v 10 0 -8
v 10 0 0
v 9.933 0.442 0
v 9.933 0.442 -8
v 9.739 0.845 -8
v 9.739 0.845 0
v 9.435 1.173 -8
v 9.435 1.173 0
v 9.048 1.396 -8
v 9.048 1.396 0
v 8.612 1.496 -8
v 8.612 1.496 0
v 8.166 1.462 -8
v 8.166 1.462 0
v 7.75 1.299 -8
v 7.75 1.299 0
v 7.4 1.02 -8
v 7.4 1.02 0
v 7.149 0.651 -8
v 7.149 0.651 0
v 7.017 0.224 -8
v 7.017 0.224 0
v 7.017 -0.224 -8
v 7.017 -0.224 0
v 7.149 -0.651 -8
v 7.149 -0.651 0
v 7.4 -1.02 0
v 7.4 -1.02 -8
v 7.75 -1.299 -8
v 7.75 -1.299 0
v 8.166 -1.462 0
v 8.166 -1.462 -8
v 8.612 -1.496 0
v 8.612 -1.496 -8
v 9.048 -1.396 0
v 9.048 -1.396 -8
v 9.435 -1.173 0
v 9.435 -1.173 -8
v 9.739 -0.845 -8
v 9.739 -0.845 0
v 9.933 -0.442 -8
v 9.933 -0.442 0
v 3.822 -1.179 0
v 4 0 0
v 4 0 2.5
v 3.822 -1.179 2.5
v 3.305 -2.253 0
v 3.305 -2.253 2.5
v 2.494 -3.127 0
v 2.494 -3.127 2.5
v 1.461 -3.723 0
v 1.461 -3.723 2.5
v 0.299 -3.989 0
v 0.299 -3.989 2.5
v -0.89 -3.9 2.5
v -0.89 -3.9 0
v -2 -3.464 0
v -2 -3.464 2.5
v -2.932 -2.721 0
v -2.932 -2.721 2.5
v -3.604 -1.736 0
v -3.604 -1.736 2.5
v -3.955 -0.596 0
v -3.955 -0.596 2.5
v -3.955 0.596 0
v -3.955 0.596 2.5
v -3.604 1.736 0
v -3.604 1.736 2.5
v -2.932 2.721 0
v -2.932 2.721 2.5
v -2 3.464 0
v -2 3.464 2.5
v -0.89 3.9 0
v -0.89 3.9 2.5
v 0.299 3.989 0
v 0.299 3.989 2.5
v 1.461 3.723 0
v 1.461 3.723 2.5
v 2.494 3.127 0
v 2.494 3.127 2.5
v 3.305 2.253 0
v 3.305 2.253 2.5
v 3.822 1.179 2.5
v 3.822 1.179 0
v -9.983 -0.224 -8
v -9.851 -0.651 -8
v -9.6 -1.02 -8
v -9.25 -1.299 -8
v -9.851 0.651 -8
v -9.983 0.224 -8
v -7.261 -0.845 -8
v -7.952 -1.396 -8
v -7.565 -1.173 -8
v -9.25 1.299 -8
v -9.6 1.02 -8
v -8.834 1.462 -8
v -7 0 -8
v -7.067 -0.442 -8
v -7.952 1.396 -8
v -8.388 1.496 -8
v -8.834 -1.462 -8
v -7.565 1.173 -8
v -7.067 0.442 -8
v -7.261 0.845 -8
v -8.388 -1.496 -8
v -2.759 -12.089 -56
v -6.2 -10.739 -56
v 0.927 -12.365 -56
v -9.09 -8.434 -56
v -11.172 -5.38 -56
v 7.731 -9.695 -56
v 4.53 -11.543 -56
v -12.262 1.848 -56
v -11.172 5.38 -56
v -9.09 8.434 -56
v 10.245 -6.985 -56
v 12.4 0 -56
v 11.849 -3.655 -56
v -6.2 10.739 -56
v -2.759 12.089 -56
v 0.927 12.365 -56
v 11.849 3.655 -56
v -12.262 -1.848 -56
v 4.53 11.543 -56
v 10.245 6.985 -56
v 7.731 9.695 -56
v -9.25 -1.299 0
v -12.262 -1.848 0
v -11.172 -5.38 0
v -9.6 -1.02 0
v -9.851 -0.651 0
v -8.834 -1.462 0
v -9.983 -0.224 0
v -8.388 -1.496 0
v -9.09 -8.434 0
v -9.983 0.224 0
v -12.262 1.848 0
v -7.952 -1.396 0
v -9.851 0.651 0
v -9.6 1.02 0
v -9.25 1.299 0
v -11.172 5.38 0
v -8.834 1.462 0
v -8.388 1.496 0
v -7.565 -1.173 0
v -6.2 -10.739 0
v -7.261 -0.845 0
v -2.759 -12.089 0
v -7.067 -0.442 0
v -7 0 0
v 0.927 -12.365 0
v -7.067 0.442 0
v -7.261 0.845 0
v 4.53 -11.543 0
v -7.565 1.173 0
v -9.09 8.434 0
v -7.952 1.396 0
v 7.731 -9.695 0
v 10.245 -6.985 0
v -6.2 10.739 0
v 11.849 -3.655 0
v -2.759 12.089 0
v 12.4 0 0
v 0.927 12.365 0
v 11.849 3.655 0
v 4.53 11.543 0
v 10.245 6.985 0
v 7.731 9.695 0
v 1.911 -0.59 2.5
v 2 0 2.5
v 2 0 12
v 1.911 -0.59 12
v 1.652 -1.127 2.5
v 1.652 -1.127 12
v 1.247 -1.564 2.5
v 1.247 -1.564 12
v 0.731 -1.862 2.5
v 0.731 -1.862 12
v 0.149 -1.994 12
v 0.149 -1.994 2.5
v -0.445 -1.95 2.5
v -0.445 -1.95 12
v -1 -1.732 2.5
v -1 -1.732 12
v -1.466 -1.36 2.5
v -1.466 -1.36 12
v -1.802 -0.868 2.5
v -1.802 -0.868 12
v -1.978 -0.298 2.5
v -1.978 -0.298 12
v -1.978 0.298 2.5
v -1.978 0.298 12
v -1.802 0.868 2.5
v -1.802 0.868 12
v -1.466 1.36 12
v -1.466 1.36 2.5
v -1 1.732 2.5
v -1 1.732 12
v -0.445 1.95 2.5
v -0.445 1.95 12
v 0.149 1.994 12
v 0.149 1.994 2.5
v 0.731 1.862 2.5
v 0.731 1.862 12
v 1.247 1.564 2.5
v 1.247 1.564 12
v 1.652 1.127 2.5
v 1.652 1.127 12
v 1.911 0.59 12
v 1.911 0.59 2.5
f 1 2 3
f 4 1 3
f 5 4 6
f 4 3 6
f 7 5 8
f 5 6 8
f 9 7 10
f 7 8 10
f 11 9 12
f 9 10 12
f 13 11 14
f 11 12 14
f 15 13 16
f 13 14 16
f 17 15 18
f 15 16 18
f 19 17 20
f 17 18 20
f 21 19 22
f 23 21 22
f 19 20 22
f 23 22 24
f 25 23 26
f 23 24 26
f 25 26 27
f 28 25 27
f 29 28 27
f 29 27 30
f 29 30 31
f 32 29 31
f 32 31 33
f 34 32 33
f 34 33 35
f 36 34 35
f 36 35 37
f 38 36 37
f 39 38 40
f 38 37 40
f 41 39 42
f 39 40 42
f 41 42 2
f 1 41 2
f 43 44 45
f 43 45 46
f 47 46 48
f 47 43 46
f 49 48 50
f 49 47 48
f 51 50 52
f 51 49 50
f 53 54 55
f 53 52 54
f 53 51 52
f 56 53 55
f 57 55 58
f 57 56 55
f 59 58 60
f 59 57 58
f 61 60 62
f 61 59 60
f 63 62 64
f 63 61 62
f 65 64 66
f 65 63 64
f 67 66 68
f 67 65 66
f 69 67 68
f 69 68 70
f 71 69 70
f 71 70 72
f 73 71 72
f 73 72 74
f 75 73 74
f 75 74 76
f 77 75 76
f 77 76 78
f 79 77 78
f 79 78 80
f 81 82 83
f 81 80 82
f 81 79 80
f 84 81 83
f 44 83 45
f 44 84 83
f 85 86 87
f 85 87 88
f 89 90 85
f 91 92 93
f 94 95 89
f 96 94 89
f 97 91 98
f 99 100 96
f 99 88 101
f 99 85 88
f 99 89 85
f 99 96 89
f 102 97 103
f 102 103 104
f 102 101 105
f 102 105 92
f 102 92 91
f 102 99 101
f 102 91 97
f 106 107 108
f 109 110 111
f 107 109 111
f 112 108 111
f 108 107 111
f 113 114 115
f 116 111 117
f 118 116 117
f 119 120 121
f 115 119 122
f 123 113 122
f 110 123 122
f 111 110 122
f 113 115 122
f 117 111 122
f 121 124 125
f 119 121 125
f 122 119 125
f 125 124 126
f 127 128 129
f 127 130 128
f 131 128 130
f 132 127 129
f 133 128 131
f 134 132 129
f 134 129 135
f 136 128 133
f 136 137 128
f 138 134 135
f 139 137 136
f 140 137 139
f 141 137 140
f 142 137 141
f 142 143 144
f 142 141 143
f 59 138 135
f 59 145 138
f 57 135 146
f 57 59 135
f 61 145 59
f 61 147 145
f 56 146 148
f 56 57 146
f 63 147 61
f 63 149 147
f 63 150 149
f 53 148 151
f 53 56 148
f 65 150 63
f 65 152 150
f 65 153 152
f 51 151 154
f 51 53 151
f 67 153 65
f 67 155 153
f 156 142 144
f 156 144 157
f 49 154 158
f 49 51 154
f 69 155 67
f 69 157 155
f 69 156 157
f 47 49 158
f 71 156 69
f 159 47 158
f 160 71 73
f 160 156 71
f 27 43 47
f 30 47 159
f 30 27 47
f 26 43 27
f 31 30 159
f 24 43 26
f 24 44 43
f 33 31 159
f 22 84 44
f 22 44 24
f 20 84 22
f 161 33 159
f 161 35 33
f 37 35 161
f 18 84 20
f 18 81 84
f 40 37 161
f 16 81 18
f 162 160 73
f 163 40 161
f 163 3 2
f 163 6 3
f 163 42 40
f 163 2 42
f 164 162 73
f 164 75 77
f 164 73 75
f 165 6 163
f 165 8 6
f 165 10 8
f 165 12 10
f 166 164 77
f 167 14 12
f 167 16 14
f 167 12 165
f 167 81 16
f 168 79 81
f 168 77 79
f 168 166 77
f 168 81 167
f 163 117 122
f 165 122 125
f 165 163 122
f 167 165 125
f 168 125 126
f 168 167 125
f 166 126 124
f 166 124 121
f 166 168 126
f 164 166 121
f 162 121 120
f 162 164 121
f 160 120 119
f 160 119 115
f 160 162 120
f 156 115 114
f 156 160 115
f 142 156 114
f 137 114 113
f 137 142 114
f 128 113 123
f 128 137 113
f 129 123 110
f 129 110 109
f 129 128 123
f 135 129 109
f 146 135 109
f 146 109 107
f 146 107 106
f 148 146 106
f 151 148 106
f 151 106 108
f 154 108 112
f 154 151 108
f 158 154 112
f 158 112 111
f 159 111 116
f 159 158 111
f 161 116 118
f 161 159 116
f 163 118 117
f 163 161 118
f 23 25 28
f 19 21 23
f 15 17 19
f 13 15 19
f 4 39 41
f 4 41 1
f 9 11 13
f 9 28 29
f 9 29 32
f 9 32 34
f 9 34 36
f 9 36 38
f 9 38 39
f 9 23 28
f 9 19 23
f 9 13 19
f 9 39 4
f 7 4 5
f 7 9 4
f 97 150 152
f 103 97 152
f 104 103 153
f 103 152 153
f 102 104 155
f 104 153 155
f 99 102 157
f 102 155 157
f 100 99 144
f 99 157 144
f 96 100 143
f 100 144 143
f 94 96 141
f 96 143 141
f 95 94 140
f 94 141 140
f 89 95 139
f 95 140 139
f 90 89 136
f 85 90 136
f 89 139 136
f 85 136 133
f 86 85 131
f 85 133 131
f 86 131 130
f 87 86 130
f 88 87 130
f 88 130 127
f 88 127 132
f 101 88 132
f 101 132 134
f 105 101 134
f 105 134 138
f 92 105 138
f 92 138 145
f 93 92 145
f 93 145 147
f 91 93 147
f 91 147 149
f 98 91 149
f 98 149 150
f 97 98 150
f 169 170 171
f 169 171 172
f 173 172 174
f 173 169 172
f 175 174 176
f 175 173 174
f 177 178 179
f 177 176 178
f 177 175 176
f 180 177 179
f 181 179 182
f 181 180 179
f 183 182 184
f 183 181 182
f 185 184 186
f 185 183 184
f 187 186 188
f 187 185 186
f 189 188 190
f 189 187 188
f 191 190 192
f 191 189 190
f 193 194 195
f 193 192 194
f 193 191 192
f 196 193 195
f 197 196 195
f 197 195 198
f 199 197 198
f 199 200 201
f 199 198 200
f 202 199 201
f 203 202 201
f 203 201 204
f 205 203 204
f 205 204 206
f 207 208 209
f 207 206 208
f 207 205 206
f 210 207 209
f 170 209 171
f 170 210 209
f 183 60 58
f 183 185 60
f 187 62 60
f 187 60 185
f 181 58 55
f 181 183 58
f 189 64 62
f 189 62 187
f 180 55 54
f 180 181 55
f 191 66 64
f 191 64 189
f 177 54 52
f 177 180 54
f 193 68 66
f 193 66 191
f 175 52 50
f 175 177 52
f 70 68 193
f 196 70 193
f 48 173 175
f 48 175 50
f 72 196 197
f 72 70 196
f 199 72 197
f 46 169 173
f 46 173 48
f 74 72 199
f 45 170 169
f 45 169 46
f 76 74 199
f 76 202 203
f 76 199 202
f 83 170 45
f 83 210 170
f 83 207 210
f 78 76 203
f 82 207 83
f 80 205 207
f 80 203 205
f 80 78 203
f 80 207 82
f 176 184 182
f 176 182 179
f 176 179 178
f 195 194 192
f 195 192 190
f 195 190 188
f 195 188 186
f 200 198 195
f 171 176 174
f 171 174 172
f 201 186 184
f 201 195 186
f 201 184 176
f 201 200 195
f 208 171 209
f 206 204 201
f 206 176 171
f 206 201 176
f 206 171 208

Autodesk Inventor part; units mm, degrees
ref_plane "YZ Plane" through (0, 0, 0) normal (1, 0, 0) x (0, 1, 0)
ref_plane "XY Plane" through (0, 0, 0) normal (0, 0, 1) x (1, 0, 0)
sketch "Sketch1" plane through (0, 0, 0) normal (0, 0, 1) x (1, 0, 0)
  circle A0 centre (0, 0) radius 12.4
  dimension "d0" = 24.8
extrude "Extrusion1" add sketch "Sketch1" against normal blind 56
sketch "Sketch2" plane through (0, 0, 0) normal (0, 0, 1) x (1, 0, 0)
  circle A0 centre (0, 0) radius 4
  dimension "d3" = 8
extrude "Extrusion2" add sketch "Sketch2" along normal blind 2.5
sketch "Sketch3" plane through (0, 0, 2.5) normal (0, 0, 1) x (1, 0, 0)
  circle A0 centre (0, 0) radius 2
  dimension "d6" = 4
extrude "Extrusion3" add sketch "Sketch3" along normal blind 9.5
sketch "Sketch4" plane through (0, 0, 0) normal (0, 0, 1) x (1, 0, 0)
  circle A0 centre (-8.5, 0) radius 1.5
  circle A1 centre (8.5, 0) radius 1.5
  circle A2 centre (0, 0) radius 2 projected
  line L0 (-8.5, 0) -> (0, 0) construction
  line L1 (0, 0) -> (8.5, 0) construction
  dimension "d9" = 3
  dimension "d10" = 3
  dimension "d11" = 17
  dimension "d12" = 8.5
extrude "Extrusion4" cut sketch "Sketch4" against normal blind 8 contours A0 | A1
ref_plane "Work Plane1" through (0, -12.4, 0) normal (0, 1, 0) x (-1, 0, 0)
equation "\"d10\" = d9"
equation "\"d12\" = 0.5 * d11"
properties part number "motor"
